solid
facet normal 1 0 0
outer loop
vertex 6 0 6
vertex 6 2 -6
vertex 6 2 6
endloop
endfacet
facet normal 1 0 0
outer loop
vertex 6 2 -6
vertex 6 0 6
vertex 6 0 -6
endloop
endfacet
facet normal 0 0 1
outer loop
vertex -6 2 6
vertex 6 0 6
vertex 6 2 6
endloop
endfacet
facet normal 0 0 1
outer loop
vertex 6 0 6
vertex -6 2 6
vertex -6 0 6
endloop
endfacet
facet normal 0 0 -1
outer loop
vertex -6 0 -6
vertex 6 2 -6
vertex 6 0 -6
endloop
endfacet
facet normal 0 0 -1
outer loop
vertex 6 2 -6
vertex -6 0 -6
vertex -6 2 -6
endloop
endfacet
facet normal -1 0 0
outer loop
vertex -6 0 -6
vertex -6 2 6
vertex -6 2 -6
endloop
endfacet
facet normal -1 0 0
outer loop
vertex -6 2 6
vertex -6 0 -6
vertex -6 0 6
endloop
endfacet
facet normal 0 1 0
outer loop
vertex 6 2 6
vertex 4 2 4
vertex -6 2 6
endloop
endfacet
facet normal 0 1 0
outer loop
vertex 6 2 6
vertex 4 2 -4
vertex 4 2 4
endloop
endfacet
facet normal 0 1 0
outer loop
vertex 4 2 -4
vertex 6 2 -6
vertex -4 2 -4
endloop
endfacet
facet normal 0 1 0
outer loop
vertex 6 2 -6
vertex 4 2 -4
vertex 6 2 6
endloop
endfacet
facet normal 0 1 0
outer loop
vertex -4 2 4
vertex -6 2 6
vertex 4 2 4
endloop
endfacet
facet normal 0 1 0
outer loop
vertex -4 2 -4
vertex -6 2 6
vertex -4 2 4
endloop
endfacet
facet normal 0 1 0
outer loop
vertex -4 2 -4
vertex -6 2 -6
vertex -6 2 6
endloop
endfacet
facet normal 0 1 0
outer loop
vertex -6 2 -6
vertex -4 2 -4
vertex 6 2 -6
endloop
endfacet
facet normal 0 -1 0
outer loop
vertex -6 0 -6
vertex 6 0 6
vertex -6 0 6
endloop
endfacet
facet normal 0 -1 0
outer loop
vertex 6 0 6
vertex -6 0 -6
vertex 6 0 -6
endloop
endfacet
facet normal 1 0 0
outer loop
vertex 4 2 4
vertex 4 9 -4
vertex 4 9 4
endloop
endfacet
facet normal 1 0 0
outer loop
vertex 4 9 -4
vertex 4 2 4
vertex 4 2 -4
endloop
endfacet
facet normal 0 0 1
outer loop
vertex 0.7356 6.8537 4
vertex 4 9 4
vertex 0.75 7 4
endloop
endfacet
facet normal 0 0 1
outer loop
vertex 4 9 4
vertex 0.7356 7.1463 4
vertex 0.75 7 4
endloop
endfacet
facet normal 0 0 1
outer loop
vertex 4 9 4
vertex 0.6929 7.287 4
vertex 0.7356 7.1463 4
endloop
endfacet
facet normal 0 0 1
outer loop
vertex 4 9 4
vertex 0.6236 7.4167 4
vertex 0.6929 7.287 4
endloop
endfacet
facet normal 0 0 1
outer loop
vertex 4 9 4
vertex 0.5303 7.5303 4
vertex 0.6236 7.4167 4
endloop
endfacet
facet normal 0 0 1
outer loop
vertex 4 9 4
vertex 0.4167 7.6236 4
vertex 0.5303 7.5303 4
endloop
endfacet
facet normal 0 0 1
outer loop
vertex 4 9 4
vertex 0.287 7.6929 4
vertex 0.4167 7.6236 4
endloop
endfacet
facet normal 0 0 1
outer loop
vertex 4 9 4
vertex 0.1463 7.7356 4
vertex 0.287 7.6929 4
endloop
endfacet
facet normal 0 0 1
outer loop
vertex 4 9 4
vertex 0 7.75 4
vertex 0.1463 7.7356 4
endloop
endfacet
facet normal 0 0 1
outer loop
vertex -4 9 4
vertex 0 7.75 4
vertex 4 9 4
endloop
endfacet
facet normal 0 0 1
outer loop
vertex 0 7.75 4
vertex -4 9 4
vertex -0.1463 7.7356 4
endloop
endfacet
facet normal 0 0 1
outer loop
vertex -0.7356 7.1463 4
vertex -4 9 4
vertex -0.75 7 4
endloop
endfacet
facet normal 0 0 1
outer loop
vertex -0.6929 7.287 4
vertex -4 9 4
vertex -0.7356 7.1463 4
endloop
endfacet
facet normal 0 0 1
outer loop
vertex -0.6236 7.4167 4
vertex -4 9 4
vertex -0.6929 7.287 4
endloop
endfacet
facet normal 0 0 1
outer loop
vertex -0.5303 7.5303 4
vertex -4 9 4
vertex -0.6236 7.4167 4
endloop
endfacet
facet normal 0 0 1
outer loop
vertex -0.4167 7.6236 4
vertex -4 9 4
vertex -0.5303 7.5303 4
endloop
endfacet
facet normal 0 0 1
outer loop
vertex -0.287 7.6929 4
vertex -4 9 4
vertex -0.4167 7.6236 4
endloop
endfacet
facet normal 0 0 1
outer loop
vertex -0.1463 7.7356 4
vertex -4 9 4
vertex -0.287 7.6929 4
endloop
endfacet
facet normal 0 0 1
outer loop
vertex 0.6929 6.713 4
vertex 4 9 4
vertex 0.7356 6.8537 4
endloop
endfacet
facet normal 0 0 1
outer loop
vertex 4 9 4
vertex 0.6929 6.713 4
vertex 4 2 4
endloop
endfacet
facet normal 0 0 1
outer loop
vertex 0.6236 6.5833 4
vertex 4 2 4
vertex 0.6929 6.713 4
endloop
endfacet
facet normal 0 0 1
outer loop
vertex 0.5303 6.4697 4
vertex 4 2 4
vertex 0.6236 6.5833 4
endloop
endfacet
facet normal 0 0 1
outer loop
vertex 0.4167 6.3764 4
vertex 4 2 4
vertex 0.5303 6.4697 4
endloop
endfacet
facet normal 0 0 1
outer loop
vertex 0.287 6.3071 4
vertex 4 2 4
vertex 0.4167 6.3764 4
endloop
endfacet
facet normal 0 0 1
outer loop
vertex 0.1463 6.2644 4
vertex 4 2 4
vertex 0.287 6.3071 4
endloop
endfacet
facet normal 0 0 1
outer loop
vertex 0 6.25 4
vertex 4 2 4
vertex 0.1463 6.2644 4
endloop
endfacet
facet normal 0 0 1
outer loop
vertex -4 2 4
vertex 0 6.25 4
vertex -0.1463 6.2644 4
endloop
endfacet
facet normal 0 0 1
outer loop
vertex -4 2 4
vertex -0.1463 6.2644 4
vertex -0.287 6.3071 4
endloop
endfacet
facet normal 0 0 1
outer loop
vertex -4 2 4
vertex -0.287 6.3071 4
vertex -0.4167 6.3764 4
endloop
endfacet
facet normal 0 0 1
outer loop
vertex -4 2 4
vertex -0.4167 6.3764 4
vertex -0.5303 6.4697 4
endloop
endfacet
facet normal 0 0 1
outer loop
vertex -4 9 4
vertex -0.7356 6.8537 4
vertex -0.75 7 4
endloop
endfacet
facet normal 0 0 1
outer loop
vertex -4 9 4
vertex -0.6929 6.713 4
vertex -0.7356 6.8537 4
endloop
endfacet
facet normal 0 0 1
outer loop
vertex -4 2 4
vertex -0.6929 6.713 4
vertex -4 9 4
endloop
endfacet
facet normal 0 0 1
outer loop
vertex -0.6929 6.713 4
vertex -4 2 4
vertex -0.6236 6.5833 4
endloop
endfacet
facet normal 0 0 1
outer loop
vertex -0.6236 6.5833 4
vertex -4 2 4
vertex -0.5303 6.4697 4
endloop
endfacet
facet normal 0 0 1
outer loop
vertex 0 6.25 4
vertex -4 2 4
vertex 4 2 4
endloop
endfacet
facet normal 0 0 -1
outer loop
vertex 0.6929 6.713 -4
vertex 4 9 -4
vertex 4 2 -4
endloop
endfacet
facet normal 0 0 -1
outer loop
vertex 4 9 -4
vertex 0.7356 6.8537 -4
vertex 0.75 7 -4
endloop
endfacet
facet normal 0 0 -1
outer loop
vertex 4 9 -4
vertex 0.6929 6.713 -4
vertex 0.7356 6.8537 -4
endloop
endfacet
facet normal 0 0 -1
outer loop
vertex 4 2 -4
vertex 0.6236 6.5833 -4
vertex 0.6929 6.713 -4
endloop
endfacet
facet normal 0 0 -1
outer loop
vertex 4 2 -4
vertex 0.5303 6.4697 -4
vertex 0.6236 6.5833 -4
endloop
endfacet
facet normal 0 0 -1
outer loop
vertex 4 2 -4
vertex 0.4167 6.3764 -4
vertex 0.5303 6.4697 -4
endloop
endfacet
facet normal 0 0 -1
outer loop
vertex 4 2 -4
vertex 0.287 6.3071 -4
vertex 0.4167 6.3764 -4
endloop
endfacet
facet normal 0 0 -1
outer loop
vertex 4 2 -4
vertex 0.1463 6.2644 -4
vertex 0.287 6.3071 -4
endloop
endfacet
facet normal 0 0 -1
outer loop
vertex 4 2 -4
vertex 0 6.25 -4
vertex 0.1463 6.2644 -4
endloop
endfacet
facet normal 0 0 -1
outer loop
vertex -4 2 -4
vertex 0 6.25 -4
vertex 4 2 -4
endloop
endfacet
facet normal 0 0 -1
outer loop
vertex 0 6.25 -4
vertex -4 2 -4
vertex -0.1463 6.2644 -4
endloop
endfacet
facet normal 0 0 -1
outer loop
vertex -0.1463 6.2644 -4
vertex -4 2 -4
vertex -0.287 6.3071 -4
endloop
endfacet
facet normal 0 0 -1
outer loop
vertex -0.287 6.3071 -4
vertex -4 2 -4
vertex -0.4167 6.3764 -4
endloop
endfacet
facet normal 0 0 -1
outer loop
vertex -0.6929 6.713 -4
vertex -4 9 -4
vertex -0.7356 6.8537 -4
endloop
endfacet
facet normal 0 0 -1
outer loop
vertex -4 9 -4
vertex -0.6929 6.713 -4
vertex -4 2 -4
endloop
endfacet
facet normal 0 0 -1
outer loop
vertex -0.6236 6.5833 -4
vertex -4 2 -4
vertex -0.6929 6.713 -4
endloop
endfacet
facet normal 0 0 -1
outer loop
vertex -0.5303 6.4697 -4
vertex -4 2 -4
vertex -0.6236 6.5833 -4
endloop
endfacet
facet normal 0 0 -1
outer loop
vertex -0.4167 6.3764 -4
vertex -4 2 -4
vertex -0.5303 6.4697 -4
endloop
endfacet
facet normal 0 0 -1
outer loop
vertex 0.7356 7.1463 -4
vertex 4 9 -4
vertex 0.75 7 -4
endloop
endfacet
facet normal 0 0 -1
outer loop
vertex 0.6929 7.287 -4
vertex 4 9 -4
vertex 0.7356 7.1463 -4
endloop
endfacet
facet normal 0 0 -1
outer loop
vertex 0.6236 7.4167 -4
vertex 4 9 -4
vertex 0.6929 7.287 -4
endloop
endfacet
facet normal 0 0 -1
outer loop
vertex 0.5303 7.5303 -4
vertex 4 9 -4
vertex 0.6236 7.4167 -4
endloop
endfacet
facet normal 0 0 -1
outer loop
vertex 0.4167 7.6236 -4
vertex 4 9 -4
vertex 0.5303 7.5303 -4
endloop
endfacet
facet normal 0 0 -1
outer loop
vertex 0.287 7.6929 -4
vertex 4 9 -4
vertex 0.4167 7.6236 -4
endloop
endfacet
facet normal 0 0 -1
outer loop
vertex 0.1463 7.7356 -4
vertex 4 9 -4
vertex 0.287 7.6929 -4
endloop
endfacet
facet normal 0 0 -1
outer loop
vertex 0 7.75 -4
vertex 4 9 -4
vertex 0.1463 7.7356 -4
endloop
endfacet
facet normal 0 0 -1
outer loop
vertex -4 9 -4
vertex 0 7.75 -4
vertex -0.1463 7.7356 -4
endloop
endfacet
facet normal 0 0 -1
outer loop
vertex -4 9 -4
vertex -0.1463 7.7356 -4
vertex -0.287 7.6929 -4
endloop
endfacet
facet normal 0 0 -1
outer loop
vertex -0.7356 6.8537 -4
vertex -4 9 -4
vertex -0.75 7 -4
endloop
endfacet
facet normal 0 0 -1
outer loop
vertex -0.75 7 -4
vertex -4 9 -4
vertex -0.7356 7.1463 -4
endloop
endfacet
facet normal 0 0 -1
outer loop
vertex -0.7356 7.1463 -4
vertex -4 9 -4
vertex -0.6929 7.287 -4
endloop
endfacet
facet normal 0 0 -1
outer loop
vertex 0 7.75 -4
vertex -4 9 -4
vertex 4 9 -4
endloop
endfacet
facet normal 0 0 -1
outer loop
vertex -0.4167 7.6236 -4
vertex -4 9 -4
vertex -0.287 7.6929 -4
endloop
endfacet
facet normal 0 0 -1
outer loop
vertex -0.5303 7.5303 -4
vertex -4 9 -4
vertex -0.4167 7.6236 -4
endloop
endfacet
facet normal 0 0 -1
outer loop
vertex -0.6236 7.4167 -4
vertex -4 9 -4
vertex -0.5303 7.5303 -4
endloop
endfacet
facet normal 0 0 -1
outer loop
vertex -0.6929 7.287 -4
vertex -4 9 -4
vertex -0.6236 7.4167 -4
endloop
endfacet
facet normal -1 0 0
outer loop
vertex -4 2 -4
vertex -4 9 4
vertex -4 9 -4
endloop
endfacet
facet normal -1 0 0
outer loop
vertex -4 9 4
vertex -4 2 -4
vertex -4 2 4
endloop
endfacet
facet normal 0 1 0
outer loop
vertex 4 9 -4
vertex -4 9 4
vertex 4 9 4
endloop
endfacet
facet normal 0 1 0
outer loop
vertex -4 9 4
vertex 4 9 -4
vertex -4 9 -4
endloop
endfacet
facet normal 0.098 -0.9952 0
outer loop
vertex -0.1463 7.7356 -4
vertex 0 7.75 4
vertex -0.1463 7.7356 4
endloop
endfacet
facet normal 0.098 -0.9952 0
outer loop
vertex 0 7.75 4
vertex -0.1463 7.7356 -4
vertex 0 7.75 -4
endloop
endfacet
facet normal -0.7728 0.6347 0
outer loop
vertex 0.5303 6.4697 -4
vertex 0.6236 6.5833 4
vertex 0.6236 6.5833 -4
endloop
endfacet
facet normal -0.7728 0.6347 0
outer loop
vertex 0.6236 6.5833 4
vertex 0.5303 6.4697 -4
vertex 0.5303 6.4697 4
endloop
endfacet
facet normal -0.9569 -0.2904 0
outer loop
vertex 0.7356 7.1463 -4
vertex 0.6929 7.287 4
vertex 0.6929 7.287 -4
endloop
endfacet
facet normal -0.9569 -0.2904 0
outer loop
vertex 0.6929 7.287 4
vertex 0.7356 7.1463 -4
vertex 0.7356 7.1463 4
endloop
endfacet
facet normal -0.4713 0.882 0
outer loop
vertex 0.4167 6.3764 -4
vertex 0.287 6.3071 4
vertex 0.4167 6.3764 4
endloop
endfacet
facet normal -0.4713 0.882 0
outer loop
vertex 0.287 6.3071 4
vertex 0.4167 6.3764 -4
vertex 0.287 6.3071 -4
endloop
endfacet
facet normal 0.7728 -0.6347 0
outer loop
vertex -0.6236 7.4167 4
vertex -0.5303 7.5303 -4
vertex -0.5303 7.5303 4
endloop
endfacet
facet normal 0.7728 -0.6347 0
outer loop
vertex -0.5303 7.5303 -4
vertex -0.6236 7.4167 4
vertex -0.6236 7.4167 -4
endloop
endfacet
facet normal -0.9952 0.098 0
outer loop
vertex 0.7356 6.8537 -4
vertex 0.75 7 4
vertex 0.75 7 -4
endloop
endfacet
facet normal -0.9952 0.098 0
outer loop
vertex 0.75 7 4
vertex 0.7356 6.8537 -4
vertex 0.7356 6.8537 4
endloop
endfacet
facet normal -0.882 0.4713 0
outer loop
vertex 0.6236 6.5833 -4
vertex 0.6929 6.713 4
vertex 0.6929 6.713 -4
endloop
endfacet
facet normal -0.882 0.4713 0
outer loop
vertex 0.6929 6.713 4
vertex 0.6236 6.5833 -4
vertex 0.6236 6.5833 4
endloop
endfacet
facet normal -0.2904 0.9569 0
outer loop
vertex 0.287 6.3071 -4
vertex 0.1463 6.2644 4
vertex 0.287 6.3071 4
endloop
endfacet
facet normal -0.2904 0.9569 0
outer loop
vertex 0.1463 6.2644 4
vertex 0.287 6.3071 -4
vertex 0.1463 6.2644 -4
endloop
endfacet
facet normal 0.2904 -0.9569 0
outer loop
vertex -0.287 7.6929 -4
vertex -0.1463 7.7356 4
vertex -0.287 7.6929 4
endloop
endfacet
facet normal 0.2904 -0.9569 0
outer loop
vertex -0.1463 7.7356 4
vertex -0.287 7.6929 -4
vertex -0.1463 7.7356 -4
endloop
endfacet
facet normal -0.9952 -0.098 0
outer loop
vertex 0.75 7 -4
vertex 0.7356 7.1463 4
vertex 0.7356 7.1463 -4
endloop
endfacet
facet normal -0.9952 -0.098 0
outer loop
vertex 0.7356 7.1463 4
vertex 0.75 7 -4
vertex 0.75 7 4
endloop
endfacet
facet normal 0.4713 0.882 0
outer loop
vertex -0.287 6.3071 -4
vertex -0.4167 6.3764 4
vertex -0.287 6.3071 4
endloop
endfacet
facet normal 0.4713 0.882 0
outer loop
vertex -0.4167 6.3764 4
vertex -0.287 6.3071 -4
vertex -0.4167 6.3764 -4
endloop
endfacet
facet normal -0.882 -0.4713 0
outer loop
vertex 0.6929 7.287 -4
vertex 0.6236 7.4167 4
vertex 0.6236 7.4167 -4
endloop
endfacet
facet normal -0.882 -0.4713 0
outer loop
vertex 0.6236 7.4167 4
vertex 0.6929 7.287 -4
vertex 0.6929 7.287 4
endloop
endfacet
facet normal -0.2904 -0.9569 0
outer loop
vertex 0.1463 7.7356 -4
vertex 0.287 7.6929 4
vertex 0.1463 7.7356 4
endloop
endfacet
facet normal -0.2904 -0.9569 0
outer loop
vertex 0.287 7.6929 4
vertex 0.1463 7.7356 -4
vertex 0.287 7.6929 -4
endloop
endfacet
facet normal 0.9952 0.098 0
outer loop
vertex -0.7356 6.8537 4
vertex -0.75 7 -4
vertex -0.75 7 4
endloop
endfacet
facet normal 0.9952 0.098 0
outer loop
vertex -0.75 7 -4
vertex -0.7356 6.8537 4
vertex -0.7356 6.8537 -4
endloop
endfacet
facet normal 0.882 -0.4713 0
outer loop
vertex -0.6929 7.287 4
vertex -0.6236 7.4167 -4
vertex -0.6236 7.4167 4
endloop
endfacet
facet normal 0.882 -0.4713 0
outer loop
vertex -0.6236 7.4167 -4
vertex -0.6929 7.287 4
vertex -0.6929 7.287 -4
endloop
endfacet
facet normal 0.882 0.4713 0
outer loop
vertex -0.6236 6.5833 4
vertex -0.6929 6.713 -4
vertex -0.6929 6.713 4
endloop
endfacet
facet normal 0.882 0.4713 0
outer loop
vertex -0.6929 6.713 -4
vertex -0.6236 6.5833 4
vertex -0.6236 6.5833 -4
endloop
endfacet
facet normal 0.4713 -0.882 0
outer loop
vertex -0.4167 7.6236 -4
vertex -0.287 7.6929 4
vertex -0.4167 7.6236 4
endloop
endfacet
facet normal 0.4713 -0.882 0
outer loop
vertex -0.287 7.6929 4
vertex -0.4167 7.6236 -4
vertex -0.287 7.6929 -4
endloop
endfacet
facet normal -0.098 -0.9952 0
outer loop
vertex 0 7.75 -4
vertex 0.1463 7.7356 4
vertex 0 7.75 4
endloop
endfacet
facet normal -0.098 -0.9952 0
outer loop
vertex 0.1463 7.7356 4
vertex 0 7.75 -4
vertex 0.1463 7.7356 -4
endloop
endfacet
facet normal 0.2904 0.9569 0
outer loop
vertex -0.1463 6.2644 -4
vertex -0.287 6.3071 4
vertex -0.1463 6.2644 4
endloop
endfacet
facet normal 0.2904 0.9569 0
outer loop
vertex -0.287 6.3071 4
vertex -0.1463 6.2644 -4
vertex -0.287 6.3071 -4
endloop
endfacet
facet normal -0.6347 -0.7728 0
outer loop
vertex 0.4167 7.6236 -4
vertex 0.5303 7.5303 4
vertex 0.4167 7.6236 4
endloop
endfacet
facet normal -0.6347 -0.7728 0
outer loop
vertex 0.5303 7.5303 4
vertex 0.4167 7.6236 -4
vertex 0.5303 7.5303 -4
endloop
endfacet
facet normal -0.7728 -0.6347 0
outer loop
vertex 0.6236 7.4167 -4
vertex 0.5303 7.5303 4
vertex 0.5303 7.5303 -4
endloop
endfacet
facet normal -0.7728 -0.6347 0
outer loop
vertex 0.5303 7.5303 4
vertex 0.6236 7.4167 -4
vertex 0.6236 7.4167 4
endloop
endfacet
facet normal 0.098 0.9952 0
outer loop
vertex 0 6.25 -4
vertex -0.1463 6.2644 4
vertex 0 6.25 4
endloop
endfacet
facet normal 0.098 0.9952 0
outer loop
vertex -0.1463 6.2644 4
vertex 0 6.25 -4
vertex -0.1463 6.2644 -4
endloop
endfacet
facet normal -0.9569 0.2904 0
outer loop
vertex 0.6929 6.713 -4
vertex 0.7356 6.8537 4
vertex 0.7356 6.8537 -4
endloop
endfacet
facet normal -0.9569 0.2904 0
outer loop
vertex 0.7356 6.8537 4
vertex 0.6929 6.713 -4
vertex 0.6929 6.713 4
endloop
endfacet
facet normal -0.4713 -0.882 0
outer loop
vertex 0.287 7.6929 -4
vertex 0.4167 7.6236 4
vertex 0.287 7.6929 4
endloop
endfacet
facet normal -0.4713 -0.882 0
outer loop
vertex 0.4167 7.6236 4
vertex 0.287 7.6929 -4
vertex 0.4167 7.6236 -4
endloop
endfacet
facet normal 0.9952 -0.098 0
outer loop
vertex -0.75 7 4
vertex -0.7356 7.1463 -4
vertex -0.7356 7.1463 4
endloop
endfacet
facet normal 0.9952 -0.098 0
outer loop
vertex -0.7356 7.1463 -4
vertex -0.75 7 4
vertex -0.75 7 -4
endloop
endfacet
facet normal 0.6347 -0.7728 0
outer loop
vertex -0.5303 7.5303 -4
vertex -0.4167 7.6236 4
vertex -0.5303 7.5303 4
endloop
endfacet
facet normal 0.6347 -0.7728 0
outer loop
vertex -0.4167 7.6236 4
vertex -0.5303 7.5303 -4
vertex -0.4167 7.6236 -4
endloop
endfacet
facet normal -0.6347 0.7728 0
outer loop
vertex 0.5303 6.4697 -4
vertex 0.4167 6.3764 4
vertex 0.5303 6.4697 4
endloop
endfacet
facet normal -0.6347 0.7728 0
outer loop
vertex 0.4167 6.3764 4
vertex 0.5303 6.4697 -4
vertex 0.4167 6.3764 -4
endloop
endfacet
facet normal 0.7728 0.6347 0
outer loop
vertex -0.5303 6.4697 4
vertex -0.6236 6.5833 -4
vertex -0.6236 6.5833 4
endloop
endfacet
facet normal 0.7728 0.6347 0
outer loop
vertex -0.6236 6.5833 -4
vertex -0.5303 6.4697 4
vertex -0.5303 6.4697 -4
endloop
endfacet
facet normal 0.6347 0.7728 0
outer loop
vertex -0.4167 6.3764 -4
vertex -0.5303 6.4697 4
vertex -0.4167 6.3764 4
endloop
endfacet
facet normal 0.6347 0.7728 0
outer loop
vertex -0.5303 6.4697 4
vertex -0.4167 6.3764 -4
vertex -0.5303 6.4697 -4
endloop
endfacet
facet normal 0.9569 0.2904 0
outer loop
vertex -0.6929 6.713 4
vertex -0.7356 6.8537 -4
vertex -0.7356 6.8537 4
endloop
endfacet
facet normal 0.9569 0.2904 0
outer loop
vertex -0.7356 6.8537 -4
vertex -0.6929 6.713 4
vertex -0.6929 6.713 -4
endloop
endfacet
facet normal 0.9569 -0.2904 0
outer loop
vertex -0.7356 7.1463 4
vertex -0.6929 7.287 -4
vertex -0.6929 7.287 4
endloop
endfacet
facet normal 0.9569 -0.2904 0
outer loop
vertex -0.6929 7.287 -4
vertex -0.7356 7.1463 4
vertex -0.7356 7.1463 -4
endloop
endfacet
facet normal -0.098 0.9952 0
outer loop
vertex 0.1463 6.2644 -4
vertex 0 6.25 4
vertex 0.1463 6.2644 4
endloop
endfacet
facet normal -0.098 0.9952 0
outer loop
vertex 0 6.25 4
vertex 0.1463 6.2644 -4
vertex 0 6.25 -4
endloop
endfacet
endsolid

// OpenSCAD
// rcrs49_wire_post.scad
// Serenity UAV Rev R — 49 MHz XCVR Top-Wire Antenna Post (24" build)
//
// Purpose:
//   Simple insulated PETG mast posts for the top-wire element of the AX.25 /
//   49 MHz XCVR antenna(s).  TWO independent antennas are built from this
//   same post (River's Room and Simon's Medbay each need their own — see
//   TODO.md §1.4.2, 2026-06-22) — print FOUR posts total, two per antenna:
//
//   River's antenna — PORT flank, shoulder height (between the dorsal ridge
//     and the cargo clamshell door's ventral hinge/swing zone — see below).
//     Forward post at station ≈ 4.72 in (120 mm) from nose (head section).
//     Aft post at station ≈ 22.8 in (580 mm) from nose (rear section,
//     temporary; replaced by integrated mount in Phase 11).
//
//   Simon's antenna — STARBOARD flank, mirrored station and shoulder height.
//
//   Rev R moved both antennas off the dorsal centreline and off any ventral
//   routing (2026-06-22): a single shared dorsal run put both elements too
//   close together (mutual coupling/detuning risk at 49 MHz on this small
//   an airframe); a ventral/keel run was rejected outright because the cargo
//   bay clamshell doors (`generate_cargo_doors.py`) hinge at the outboard
//   flank/belly edge and swing up to 180°, sweeping the lower flank and
//   belly through the door's Y-span — any exterior post mounted there would
//   be in the door's path. Port/starboard at shoulder height (well above
//   the door's reach, well separated from each other) clears both problems.
//   Exact shoulder-height Z offset still needs a FreeCAD cross-section check
//   against the door swing envelope before bonding any post — see TODO.md.
//
// Geometry:
//   Base:  0.47 × 0.47 × 0.079 in (12 × 12 × 2 mm) flat foot — bonded or
//          screwed (M2 flat-head) to hull dorsal skin.
//   Mast:  0.31 × 0.31 × 0.28 in (8 × 8 × 7 mm) upright column on base.
//   Notch: 0.059 in (1.5 mm) diameter bore running athwartships (Z-axis)
//          through the mast, 0.079 in (2 mm) from the mast top.
//          Wire passes through the bore and is retained by a loop or crimp.
//   Total height: 0.35 in (9 mm) — within REVN_BUILD_GUIDE_24IN.md "~10 mm".
//
// Material:  PETG (non-structural / EMI-transparent insulator, no CF filler).
// Print spec: 0.15 mm layer height, 4 perimeters, 40% gyroid infill.
// Orientation: print upright (base on build plate, mast faces up) for best
//   bore roundness.
//
// Installation:
//   Bond base to hull skin (port flank for River's antenna, starboard flank
//   for Simon's — NOT dorsal centreline, NOT ventral/keel line) at shoulder
//   height with West System 105/206 structural epoxy.  Thread 49 MHz antenna
//   wire through bore; dress wire aft to aft post.  For each forward post,
//   feed wire to that bay's own Commo (XCVR-49MHZ-2) J2: River's Room for the
//   port antenna, Simon's Medbay for the starboard antenna — the two Commo
//   boards do not share an antenna (TODO.md §1.4.2, redundancy mandate).
//
// References:
//   archives/docs-superseded/REVN_BUILD_GUIDE_24IN_rev_s_stub.md, Phase 1, Step 8 (superseded by §1.4.2
//     port/starboard relocation, 2026-06-22 — update build guide to match):
//     "Print from rcrs49_wire_post.scad: forward post (~120 mm from nose) +
//      aft post (~580 mm from nose)" — now ×2 sets (port + starboard).
//   AGENTS.md §Component Naming: River = 49 MHz XCVR primary antenna;
//     Simon also carries 49 MHz primary (independent antenna, starboard).
//   TODO.md §1.4.2 (2026-06-22): port/starboard relocation rationale.
//
// Author:  Steve Griffing, PE(CSE), CISSP-ISSEP, CPP
// License: CC BY 4.0  <https://creativecommons.org/licenses/by/4.0/>
// Date:    2026-06-11
// Rev:     R (2026-06-11): Initial release.

// ── Resolution ────────────────────────────────────────────────────────────────

$fn = 32;   // adequate for 1.5 mm bore; keeps render fast for this simple part

// ── Parameters ────────────────────────────────────────────────────────────────

// Base (foot) dimensions
BASE_X = 12.0;   // [mm] base fore-aft length (0.47 in)
BASE_Z = 12.0;   // [mm] base athwartships width (0.47 in)
BASE_Y =  2.0;   // [mm] base thickness, sits flat on hull skin (0.079 in)

// Mast (column) dimensions
MAST_X =  8.0;   // [mm] mast fore-aft width (0.31 in) — centred on base
MAST_Z =  8.0;   // [mm] mast athwartships depth (0.31 in) — centred on base
MAST_Y =  7.0;   // [mm] mast height above base top face (0.28 in)

// Wire retention bore
WIRE_D      =  1.5;   // [mm] wire bore diameter — accepts up to 20 AWG antenna wire
WIRE_Y_FROM_TOP = 2.0;   // [mm] bore centre height below mast top face

// Derived heights
TOTAL_Y = BASE_Y + MAST_Y;   // [mm] total post height = 9.0 mm (0.35 in)
WIRE_Y  = BASE_Y + MAST_Y - WIRE_Y_FROM_TOP;   // [mm] bore centre from base bottom

// ── Module: wire_post ─────────────────────────────────────────────────────────
//
// Single antenna wire post.  Origin at base bottom-face centroid.
// +X = fore, +Z = port (athwartships), +Y = up (away from hull surface).
//
module wire_post() {
    difference() {
        union() {
            // ── Base foot ─────────────────────────────────────────────────
            // Flat plate centred at origin, sitting flush on hull skin.
            translate([-BASE_X/2, 0, -BASE_Z/2])
                cube([BASE_X, BASE_Y, BASE_Z]);

            // ── Mast column ───────────────────────────────────────────────
            // Upright column, centred on base, rising from base top face.
            translate([-MAST_X/2, BASE_Y, -MAST_Z/2])
                cube([MAST_X, MAST_Y, MAST_Z]);
        }

        // ── Wire retention bore ───────────────────────────────────────────
        // Athwartships (Z-axis) bore through mast, WIRE_Y_FROM_TOP below top.
        // Extends 0.1 mm proud of each face for clean manifold cut.
        translate([0, WIRE_Y, -MAST_Z/2 - 0.1])
            cylinder(h = MAST_Z + 0.2, d = WIRE_D);
    }
}

// ── Render ────────────────────────────────────────────────────────────────────
//
// Renders one post.  The module is generic (no port/starboard parameter —
// orientation comes from how the printed post is bonded to the hull
// surface).  Print FOUR total: River's antenna (port flank) forward
// (sta ~120 mm) + aft (sta ~580 mm), and Simon's antenna (starboard flank)
// forward (sta ~120 mm) + aft (sta ~580 mm).  See TODO.md §1.4.2.

wire_post();
